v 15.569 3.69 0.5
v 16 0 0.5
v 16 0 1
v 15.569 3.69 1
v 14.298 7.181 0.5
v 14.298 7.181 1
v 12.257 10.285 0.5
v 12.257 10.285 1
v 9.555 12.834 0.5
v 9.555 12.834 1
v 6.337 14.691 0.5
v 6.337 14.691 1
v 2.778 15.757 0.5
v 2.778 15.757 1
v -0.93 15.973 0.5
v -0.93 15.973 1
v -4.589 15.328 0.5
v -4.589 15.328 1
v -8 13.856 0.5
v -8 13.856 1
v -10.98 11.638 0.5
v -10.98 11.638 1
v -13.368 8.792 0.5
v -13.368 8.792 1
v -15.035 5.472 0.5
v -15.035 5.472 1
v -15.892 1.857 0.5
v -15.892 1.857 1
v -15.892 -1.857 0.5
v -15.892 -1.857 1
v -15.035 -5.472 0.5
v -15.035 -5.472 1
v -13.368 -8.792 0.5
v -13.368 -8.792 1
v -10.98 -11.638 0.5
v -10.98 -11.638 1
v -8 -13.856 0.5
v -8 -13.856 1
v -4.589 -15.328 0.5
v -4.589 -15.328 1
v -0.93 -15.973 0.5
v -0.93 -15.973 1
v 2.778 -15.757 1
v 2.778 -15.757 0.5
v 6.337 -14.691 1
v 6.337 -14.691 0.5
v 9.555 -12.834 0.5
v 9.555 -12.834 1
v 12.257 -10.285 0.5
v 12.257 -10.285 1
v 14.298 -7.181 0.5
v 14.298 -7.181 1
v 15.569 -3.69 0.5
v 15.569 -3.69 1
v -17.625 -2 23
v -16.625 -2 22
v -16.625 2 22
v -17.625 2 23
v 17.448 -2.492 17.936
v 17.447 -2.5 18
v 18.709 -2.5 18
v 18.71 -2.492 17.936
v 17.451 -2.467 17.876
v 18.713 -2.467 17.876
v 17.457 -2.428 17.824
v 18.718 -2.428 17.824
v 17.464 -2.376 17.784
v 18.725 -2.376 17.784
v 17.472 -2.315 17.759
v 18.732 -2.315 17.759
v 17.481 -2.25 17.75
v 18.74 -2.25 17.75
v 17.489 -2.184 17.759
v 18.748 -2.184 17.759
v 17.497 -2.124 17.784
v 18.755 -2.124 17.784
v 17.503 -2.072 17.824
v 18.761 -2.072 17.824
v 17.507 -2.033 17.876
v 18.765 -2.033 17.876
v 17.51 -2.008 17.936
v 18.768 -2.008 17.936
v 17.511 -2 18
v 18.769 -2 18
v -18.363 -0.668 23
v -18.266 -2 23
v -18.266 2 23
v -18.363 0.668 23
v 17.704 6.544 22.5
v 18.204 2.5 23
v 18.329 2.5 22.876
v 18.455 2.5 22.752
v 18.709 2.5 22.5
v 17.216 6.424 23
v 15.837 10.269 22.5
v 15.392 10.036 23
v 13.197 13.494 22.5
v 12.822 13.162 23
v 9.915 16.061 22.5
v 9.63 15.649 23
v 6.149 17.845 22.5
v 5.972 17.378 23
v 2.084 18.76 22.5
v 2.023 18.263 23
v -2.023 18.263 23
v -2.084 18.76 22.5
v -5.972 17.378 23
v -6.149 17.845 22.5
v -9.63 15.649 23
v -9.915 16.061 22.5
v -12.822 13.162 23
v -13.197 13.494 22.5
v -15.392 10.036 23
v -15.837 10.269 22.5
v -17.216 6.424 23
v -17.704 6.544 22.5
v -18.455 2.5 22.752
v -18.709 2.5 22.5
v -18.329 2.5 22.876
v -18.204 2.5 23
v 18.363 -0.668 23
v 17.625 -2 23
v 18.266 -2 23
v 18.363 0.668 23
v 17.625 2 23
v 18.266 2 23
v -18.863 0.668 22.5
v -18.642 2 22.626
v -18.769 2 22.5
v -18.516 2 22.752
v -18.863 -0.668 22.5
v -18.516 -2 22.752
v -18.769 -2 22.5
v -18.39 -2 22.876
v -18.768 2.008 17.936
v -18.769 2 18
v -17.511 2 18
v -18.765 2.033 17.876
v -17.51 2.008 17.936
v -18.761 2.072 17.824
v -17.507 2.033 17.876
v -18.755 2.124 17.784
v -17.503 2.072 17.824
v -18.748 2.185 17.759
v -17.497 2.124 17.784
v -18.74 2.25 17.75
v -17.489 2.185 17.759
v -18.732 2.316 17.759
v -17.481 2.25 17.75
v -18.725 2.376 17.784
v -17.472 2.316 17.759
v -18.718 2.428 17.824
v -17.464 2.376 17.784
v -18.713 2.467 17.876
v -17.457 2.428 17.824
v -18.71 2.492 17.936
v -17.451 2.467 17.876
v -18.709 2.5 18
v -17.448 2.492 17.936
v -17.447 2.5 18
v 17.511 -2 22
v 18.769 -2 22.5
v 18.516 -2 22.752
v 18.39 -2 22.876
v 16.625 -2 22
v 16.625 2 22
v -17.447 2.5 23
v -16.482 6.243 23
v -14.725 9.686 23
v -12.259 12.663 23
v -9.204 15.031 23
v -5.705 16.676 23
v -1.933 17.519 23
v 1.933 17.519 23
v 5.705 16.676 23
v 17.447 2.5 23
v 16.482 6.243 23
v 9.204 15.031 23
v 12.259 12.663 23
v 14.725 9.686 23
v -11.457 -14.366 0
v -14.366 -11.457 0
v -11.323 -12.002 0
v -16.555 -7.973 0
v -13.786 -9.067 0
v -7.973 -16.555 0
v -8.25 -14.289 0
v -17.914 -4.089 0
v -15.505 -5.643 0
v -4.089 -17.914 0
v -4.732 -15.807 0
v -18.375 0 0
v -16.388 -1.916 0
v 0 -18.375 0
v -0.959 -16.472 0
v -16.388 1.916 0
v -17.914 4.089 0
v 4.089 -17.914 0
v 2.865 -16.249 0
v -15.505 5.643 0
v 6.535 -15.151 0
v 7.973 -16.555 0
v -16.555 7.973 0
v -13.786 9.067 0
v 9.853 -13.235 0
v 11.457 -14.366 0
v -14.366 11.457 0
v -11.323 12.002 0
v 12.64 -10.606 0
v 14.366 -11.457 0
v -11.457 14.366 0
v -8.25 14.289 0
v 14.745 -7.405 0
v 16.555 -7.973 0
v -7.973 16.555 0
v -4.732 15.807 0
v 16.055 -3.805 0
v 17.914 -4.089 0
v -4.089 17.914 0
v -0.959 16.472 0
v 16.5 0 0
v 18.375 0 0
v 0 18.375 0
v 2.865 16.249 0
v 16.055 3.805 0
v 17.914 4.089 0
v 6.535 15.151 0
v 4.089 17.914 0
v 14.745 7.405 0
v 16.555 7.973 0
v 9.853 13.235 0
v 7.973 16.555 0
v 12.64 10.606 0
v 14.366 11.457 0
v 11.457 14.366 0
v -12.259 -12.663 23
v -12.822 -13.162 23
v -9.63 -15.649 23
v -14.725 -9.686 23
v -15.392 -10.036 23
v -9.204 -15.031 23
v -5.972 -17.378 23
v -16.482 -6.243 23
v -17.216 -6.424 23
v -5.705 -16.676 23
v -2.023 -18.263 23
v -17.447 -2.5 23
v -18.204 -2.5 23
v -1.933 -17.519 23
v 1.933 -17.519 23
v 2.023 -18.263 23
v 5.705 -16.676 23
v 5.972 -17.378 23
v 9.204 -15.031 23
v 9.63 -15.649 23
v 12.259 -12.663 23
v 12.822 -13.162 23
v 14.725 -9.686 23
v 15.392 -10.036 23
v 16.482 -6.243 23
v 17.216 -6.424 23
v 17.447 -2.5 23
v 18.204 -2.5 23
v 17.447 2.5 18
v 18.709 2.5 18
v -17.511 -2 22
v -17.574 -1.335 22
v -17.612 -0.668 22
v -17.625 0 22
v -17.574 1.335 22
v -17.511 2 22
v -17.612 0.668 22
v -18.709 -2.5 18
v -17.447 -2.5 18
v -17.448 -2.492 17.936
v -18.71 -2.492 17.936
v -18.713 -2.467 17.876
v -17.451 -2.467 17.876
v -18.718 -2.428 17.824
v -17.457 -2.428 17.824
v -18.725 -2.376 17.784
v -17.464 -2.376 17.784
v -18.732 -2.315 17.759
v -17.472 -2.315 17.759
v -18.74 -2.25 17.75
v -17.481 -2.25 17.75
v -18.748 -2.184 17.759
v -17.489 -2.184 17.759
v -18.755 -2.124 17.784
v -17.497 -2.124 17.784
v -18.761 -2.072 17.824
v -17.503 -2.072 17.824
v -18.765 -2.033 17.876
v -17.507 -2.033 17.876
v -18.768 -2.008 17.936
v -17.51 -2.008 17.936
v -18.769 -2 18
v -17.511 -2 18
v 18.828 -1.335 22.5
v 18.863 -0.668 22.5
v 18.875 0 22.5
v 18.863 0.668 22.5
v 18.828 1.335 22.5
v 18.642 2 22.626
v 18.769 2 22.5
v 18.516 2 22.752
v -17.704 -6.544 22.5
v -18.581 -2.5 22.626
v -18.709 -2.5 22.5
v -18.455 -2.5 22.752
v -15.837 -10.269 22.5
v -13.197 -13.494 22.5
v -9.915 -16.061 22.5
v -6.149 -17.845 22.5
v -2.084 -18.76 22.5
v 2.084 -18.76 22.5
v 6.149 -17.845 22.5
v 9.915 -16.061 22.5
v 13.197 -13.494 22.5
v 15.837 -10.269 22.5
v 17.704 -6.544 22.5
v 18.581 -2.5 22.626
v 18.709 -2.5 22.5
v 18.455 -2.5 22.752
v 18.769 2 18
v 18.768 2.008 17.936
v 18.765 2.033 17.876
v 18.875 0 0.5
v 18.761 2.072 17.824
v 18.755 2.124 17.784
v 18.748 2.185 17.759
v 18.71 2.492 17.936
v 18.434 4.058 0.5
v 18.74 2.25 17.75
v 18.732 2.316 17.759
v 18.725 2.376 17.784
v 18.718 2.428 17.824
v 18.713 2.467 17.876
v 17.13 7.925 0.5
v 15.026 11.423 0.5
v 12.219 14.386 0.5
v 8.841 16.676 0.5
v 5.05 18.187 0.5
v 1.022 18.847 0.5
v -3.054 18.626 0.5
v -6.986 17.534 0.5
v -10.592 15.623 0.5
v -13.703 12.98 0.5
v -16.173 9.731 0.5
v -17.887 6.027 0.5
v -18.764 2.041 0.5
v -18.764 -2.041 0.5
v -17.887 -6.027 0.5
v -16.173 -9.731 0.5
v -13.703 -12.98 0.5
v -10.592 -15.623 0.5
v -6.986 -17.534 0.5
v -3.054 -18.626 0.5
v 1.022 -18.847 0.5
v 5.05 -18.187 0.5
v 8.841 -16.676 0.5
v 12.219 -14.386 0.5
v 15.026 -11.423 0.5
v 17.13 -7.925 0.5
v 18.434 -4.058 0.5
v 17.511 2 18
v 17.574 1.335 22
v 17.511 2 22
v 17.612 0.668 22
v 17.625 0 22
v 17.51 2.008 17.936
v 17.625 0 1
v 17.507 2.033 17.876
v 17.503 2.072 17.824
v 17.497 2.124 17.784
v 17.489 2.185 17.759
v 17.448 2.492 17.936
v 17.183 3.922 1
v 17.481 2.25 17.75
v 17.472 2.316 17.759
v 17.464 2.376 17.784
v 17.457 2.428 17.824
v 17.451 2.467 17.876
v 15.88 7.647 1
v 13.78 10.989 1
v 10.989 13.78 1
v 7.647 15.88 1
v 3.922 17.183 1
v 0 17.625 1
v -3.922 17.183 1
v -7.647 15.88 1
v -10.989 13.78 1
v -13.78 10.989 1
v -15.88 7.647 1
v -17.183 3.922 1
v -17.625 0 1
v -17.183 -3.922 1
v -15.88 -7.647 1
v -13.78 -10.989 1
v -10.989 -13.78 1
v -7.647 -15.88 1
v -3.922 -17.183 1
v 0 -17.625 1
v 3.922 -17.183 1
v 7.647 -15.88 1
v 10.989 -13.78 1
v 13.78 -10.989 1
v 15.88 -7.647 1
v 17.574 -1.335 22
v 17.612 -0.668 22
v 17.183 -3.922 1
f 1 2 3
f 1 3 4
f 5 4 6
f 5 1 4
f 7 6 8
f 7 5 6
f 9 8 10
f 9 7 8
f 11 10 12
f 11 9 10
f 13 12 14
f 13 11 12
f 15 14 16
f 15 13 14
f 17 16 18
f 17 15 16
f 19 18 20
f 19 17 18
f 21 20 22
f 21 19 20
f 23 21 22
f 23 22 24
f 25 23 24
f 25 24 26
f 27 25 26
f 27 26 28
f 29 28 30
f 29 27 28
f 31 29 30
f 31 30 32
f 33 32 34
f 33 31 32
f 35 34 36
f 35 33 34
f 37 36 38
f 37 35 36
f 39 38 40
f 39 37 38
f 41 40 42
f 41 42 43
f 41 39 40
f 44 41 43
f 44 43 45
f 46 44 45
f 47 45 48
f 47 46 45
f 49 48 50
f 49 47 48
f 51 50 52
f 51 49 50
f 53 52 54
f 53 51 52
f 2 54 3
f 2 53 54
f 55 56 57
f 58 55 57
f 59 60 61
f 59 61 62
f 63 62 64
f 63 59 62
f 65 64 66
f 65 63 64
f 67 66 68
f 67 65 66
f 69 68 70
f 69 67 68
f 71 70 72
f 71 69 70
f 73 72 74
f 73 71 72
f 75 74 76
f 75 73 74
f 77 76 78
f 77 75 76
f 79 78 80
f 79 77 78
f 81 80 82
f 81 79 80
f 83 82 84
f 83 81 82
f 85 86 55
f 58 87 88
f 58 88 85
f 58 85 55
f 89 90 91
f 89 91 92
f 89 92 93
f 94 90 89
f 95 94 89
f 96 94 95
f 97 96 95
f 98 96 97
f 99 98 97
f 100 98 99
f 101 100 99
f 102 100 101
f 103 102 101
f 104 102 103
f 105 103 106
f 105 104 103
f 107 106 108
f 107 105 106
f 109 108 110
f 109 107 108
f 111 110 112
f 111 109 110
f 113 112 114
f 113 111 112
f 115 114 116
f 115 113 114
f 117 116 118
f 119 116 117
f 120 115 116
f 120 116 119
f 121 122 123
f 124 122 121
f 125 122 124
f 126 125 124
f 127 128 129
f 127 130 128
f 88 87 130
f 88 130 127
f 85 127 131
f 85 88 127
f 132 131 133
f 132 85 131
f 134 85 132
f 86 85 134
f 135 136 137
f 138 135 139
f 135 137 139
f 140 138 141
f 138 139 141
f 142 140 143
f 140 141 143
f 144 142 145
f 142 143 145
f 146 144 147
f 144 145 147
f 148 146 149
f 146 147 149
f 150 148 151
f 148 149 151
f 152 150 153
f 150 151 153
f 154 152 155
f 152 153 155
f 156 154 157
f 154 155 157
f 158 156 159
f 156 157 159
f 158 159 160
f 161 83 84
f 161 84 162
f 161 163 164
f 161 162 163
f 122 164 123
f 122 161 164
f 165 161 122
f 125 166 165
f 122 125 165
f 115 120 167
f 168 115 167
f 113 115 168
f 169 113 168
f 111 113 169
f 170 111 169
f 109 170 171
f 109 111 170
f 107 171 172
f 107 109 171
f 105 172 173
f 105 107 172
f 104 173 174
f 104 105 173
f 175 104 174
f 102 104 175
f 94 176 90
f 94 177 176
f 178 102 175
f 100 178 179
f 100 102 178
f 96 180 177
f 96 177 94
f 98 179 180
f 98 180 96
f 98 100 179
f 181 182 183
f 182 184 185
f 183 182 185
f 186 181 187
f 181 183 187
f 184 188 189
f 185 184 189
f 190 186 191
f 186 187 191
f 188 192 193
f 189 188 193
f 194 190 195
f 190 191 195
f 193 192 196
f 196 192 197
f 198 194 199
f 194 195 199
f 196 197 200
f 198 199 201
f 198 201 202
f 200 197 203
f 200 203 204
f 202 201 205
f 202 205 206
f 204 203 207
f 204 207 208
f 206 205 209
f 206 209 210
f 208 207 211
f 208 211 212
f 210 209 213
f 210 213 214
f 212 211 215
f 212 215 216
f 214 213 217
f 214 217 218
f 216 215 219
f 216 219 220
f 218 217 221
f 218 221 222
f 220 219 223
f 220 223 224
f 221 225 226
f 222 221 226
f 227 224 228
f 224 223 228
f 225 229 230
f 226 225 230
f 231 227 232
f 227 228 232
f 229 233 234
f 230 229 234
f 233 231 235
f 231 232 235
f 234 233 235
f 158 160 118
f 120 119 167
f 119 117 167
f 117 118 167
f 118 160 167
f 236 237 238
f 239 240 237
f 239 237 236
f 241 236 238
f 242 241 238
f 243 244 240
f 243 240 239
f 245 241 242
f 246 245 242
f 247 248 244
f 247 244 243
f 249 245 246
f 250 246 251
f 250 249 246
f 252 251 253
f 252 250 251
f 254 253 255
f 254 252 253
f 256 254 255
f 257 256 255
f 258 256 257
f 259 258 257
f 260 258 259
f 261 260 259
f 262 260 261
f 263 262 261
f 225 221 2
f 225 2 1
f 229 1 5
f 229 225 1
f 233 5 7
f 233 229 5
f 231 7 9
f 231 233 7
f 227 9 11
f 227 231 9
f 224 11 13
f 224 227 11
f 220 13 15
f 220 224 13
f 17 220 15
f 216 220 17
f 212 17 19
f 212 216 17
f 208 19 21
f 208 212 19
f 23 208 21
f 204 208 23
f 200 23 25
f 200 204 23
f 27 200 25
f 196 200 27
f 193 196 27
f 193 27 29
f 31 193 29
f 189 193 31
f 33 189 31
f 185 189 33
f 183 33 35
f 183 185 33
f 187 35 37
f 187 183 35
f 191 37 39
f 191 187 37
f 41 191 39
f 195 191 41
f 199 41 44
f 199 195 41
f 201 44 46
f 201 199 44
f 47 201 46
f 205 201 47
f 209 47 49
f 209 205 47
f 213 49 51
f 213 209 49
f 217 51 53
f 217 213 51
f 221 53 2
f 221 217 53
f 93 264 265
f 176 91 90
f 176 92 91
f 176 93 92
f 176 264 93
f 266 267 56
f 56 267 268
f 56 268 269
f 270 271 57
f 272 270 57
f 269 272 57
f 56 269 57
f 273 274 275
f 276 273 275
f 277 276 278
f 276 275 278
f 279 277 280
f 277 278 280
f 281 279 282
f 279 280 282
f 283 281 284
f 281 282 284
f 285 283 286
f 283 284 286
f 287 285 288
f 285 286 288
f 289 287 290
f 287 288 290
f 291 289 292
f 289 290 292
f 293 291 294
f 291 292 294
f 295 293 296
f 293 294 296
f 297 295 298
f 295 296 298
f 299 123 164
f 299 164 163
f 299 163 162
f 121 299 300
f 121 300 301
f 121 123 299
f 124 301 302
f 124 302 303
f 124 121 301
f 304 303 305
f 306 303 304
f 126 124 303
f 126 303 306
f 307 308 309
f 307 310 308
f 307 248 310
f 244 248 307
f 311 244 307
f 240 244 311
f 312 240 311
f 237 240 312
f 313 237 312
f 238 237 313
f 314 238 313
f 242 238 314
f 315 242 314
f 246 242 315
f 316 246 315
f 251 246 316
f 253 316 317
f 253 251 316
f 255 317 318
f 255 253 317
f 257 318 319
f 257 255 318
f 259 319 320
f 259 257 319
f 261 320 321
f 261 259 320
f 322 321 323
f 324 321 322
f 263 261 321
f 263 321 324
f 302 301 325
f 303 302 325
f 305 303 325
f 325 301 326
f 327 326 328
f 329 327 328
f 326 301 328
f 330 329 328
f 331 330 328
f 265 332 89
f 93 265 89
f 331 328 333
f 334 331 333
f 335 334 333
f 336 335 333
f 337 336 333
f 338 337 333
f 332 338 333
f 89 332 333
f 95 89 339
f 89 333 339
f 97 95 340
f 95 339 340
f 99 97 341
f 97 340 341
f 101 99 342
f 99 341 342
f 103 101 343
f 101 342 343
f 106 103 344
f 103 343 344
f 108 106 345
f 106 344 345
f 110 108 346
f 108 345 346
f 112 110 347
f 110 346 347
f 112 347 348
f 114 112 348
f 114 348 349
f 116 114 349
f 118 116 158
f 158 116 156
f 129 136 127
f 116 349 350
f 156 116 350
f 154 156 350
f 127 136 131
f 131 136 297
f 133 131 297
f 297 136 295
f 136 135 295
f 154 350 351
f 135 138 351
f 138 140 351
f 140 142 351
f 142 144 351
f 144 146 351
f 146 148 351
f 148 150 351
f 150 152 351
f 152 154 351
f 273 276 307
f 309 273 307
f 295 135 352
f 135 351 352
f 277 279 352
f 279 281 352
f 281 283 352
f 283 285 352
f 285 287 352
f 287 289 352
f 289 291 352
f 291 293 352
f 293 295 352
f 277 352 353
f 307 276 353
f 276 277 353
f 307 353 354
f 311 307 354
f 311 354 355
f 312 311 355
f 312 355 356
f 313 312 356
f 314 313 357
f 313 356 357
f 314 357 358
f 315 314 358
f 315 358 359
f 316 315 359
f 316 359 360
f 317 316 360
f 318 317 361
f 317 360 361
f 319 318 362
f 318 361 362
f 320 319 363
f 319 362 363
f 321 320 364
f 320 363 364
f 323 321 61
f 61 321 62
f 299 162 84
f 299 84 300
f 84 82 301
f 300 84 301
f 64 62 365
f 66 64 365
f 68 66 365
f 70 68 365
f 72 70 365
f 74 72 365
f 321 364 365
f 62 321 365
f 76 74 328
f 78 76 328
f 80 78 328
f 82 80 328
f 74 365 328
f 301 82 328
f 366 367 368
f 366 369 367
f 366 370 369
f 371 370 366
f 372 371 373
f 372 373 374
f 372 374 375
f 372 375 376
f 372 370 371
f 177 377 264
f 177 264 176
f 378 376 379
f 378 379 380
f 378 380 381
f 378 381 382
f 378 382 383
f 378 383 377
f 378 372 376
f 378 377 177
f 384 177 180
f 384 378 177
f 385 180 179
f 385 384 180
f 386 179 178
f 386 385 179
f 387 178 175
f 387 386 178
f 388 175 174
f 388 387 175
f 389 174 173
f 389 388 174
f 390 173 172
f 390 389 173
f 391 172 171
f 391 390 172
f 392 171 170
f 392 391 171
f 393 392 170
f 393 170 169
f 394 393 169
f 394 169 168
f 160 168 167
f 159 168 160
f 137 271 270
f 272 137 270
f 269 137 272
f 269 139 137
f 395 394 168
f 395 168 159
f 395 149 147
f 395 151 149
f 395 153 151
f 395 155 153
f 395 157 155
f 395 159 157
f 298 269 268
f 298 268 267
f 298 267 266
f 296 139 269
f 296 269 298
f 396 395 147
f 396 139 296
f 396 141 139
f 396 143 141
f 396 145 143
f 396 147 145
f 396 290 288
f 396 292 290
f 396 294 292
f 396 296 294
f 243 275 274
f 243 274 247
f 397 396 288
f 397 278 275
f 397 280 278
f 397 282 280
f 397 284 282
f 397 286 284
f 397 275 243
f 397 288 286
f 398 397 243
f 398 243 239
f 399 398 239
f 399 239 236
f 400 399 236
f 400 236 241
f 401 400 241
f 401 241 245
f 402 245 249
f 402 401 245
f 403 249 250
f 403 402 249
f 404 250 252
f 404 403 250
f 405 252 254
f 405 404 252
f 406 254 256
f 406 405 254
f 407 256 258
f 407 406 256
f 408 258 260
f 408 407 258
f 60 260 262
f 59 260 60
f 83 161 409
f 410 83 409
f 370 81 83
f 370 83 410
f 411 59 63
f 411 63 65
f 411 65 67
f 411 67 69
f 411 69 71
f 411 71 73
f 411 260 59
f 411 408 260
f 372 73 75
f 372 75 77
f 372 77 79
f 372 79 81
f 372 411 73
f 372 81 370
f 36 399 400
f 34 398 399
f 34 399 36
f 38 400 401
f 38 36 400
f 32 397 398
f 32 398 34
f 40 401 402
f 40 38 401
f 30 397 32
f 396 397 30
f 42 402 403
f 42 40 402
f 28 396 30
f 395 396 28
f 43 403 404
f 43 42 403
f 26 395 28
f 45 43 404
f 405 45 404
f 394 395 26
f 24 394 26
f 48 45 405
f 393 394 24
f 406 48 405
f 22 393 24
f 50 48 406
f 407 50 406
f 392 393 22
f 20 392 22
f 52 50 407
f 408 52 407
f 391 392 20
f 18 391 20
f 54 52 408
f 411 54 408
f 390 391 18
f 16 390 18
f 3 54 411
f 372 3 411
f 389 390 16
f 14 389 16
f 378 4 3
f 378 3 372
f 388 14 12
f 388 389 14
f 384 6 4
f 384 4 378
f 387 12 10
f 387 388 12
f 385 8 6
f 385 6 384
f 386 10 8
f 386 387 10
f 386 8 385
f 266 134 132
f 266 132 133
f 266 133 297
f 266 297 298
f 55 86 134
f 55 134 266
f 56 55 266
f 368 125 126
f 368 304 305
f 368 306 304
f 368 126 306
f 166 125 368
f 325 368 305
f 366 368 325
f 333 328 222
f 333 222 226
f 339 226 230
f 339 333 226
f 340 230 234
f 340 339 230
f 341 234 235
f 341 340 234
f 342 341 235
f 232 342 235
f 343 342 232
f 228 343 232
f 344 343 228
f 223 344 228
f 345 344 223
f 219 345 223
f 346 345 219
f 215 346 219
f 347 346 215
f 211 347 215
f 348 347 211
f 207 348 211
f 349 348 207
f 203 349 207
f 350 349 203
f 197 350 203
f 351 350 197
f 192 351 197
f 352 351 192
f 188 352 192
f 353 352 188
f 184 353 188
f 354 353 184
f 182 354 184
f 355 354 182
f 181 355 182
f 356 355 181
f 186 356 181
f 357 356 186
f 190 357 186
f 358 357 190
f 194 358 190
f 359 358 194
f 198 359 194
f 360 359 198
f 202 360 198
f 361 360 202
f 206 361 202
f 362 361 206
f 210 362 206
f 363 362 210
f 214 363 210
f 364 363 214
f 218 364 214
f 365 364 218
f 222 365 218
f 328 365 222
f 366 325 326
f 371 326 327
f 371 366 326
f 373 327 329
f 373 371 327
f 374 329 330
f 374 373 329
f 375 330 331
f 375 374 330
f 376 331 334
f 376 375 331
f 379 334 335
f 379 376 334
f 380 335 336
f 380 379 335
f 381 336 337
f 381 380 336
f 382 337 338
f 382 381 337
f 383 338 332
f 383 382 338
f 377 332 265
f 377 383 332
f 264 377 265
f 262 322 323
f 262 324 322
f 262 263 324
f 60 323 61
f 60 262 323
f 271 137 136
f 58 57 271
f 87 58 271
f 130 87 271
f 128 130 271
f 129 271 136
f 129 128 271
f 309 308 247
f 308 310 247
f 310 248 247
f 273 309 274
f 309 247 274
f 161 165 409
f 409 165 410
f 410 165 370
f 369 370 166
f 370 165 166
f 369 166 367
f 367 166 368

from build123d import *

# Parameters (mm, degrees)
F0_R          = 18.875
F0_R_2        = 17.625
F1_DEPTH      = 23
F0_R_3        = 16
F2_DEPTH      = 1
F3_SIZE       = 0.5
F5_DEPTH      = 25
F5_DEPTH_BACK = 25
F7_DEPTH      = 1
F8_SIZE       = 0.99999


# Not quite as in the source:
# - a fillet or chamfer is up to 0.001 mm smaller than in the source, because OpenCascade refuses the exact size


with BuildPart() as f1:
    # F0 (on Top) → F1 (new body)
    with BuildSketch(Plane.XY):
        Circle(F0_R)
        Circle(F0_R_2, mode=Mode.SUBTRACT)
    extrude(amount=F1_DEPTH)

    # F0 (on Top) → F2 (join)
    with BuildSketch(Plane.XY):
        Circle(F0_R_2)
        Circle(F0_R_3, mode=Mode.SUBTRACT)
    extrude(amount=F2_DEPTH)

    # F3
    f3_edges = [f1.edges().sort_by_distance(p)[0] for p in [
        (-18.875, 0, 0),
        (-16, 0, 0),
        (-18.875, 0, 23),
    ]]
    chamfer(f3_edges, length=F3_SIZE)

    # F4 (on Right) → F5 (cut, two sides)
    with BuildSketch(Plane.YZ) as f5_sk:
        with BuildLine():
            Line((-2.5, 18), (-2, 18))
            ThreePointArc((-2, 18), (-2.25, 18.25), (-2.5, 18))
        make_face()
        with BuildLine():
            ThreePointArc((-2.5, 18), (-2.25, 17.75), (-2, 18))
            Line((-2, 18), (-2.5, 18))
        make_face()
        with BuildLine():
            ThreePointArc((-2.5, 18), (-2.25, 18.25), (-2, 18))
            Line((-2, 18), (-2, 23))
            Line((-2, 23), (-2.5, 23))
            Line((-2.5, 23), (-2.5, 18))
        make_face()
        with BuildLine():
            Line((2.5, 23), (2, 23))
            Line((2, 23), (2, 18))
            ThreePointArc((2, 18), (2.25, 18.25), (2.5, 18))
            Line((2.5, 18), (2.5, 23))
        make_face()
        with BuildLine():
            ThreePointArc((2.5, 18), (2.25, 18.25), (2, 18))
            Line((2, 18), (2.5, 18))
        make_face()
        with BuildLine():
            Line((2.5, 18), (2, 18))
            ThreePointArc((2, 18), (2.25, 17.75), (2.5, 18))
        make_face()
    extrude(amount=-F5_DEPTH, mode=Mode.SUBTRACT)
    extrude(f5_sk.sketch, amount=F5_DEPTH_BACK, mode=Mode.SUBTRACT)

    # F6 (on face) → F7 (join)
    with BuildSketch(Plane.XY.offset(23)):
        with BuildLine():
            ThreePointArc((-17.5111571577, 2), (-17.5965162732, 1.001618714), (-17.625, 0))
            Line((-17.625, 0), (-16.625, 0))
            Line((-16.625, 0), (-16.625, 2))
            Line((-16.625, 2), (-17.5111571577, 2))
        make_face()
        with BuildLine():
            Line((-16.625, 0), (-17.625, 0))
            ThreePointArc((-17.625, 0), (-17.5965162732, -1.001618714), (-17.5111571577, -2))
            Line((-17.5111571577, -2), (-16.625, -2))
            Line((-16.625, -2), (-16.625, 0))
        make_face()
        Polygon((17.8884946657, 2), (17.5111571577, 2), (16.625, 2), (16.625, 0), (16.625, -2), (17.8884946657, -2), align=None)
    extrude(amount=-F7_DEPTH)

    # F8 (size 1 in the source; OpenCascade refuses exactly that, so slightly less here)
    f8_edges = [f1.edges().sort_by_distance(p)[0] for p in [
        (-16.625, 0, 23),
        (16.625, 0, 23),
    ]]
    chamfer(f8_edges, length=F8_SIZE)


solid = f1.part
